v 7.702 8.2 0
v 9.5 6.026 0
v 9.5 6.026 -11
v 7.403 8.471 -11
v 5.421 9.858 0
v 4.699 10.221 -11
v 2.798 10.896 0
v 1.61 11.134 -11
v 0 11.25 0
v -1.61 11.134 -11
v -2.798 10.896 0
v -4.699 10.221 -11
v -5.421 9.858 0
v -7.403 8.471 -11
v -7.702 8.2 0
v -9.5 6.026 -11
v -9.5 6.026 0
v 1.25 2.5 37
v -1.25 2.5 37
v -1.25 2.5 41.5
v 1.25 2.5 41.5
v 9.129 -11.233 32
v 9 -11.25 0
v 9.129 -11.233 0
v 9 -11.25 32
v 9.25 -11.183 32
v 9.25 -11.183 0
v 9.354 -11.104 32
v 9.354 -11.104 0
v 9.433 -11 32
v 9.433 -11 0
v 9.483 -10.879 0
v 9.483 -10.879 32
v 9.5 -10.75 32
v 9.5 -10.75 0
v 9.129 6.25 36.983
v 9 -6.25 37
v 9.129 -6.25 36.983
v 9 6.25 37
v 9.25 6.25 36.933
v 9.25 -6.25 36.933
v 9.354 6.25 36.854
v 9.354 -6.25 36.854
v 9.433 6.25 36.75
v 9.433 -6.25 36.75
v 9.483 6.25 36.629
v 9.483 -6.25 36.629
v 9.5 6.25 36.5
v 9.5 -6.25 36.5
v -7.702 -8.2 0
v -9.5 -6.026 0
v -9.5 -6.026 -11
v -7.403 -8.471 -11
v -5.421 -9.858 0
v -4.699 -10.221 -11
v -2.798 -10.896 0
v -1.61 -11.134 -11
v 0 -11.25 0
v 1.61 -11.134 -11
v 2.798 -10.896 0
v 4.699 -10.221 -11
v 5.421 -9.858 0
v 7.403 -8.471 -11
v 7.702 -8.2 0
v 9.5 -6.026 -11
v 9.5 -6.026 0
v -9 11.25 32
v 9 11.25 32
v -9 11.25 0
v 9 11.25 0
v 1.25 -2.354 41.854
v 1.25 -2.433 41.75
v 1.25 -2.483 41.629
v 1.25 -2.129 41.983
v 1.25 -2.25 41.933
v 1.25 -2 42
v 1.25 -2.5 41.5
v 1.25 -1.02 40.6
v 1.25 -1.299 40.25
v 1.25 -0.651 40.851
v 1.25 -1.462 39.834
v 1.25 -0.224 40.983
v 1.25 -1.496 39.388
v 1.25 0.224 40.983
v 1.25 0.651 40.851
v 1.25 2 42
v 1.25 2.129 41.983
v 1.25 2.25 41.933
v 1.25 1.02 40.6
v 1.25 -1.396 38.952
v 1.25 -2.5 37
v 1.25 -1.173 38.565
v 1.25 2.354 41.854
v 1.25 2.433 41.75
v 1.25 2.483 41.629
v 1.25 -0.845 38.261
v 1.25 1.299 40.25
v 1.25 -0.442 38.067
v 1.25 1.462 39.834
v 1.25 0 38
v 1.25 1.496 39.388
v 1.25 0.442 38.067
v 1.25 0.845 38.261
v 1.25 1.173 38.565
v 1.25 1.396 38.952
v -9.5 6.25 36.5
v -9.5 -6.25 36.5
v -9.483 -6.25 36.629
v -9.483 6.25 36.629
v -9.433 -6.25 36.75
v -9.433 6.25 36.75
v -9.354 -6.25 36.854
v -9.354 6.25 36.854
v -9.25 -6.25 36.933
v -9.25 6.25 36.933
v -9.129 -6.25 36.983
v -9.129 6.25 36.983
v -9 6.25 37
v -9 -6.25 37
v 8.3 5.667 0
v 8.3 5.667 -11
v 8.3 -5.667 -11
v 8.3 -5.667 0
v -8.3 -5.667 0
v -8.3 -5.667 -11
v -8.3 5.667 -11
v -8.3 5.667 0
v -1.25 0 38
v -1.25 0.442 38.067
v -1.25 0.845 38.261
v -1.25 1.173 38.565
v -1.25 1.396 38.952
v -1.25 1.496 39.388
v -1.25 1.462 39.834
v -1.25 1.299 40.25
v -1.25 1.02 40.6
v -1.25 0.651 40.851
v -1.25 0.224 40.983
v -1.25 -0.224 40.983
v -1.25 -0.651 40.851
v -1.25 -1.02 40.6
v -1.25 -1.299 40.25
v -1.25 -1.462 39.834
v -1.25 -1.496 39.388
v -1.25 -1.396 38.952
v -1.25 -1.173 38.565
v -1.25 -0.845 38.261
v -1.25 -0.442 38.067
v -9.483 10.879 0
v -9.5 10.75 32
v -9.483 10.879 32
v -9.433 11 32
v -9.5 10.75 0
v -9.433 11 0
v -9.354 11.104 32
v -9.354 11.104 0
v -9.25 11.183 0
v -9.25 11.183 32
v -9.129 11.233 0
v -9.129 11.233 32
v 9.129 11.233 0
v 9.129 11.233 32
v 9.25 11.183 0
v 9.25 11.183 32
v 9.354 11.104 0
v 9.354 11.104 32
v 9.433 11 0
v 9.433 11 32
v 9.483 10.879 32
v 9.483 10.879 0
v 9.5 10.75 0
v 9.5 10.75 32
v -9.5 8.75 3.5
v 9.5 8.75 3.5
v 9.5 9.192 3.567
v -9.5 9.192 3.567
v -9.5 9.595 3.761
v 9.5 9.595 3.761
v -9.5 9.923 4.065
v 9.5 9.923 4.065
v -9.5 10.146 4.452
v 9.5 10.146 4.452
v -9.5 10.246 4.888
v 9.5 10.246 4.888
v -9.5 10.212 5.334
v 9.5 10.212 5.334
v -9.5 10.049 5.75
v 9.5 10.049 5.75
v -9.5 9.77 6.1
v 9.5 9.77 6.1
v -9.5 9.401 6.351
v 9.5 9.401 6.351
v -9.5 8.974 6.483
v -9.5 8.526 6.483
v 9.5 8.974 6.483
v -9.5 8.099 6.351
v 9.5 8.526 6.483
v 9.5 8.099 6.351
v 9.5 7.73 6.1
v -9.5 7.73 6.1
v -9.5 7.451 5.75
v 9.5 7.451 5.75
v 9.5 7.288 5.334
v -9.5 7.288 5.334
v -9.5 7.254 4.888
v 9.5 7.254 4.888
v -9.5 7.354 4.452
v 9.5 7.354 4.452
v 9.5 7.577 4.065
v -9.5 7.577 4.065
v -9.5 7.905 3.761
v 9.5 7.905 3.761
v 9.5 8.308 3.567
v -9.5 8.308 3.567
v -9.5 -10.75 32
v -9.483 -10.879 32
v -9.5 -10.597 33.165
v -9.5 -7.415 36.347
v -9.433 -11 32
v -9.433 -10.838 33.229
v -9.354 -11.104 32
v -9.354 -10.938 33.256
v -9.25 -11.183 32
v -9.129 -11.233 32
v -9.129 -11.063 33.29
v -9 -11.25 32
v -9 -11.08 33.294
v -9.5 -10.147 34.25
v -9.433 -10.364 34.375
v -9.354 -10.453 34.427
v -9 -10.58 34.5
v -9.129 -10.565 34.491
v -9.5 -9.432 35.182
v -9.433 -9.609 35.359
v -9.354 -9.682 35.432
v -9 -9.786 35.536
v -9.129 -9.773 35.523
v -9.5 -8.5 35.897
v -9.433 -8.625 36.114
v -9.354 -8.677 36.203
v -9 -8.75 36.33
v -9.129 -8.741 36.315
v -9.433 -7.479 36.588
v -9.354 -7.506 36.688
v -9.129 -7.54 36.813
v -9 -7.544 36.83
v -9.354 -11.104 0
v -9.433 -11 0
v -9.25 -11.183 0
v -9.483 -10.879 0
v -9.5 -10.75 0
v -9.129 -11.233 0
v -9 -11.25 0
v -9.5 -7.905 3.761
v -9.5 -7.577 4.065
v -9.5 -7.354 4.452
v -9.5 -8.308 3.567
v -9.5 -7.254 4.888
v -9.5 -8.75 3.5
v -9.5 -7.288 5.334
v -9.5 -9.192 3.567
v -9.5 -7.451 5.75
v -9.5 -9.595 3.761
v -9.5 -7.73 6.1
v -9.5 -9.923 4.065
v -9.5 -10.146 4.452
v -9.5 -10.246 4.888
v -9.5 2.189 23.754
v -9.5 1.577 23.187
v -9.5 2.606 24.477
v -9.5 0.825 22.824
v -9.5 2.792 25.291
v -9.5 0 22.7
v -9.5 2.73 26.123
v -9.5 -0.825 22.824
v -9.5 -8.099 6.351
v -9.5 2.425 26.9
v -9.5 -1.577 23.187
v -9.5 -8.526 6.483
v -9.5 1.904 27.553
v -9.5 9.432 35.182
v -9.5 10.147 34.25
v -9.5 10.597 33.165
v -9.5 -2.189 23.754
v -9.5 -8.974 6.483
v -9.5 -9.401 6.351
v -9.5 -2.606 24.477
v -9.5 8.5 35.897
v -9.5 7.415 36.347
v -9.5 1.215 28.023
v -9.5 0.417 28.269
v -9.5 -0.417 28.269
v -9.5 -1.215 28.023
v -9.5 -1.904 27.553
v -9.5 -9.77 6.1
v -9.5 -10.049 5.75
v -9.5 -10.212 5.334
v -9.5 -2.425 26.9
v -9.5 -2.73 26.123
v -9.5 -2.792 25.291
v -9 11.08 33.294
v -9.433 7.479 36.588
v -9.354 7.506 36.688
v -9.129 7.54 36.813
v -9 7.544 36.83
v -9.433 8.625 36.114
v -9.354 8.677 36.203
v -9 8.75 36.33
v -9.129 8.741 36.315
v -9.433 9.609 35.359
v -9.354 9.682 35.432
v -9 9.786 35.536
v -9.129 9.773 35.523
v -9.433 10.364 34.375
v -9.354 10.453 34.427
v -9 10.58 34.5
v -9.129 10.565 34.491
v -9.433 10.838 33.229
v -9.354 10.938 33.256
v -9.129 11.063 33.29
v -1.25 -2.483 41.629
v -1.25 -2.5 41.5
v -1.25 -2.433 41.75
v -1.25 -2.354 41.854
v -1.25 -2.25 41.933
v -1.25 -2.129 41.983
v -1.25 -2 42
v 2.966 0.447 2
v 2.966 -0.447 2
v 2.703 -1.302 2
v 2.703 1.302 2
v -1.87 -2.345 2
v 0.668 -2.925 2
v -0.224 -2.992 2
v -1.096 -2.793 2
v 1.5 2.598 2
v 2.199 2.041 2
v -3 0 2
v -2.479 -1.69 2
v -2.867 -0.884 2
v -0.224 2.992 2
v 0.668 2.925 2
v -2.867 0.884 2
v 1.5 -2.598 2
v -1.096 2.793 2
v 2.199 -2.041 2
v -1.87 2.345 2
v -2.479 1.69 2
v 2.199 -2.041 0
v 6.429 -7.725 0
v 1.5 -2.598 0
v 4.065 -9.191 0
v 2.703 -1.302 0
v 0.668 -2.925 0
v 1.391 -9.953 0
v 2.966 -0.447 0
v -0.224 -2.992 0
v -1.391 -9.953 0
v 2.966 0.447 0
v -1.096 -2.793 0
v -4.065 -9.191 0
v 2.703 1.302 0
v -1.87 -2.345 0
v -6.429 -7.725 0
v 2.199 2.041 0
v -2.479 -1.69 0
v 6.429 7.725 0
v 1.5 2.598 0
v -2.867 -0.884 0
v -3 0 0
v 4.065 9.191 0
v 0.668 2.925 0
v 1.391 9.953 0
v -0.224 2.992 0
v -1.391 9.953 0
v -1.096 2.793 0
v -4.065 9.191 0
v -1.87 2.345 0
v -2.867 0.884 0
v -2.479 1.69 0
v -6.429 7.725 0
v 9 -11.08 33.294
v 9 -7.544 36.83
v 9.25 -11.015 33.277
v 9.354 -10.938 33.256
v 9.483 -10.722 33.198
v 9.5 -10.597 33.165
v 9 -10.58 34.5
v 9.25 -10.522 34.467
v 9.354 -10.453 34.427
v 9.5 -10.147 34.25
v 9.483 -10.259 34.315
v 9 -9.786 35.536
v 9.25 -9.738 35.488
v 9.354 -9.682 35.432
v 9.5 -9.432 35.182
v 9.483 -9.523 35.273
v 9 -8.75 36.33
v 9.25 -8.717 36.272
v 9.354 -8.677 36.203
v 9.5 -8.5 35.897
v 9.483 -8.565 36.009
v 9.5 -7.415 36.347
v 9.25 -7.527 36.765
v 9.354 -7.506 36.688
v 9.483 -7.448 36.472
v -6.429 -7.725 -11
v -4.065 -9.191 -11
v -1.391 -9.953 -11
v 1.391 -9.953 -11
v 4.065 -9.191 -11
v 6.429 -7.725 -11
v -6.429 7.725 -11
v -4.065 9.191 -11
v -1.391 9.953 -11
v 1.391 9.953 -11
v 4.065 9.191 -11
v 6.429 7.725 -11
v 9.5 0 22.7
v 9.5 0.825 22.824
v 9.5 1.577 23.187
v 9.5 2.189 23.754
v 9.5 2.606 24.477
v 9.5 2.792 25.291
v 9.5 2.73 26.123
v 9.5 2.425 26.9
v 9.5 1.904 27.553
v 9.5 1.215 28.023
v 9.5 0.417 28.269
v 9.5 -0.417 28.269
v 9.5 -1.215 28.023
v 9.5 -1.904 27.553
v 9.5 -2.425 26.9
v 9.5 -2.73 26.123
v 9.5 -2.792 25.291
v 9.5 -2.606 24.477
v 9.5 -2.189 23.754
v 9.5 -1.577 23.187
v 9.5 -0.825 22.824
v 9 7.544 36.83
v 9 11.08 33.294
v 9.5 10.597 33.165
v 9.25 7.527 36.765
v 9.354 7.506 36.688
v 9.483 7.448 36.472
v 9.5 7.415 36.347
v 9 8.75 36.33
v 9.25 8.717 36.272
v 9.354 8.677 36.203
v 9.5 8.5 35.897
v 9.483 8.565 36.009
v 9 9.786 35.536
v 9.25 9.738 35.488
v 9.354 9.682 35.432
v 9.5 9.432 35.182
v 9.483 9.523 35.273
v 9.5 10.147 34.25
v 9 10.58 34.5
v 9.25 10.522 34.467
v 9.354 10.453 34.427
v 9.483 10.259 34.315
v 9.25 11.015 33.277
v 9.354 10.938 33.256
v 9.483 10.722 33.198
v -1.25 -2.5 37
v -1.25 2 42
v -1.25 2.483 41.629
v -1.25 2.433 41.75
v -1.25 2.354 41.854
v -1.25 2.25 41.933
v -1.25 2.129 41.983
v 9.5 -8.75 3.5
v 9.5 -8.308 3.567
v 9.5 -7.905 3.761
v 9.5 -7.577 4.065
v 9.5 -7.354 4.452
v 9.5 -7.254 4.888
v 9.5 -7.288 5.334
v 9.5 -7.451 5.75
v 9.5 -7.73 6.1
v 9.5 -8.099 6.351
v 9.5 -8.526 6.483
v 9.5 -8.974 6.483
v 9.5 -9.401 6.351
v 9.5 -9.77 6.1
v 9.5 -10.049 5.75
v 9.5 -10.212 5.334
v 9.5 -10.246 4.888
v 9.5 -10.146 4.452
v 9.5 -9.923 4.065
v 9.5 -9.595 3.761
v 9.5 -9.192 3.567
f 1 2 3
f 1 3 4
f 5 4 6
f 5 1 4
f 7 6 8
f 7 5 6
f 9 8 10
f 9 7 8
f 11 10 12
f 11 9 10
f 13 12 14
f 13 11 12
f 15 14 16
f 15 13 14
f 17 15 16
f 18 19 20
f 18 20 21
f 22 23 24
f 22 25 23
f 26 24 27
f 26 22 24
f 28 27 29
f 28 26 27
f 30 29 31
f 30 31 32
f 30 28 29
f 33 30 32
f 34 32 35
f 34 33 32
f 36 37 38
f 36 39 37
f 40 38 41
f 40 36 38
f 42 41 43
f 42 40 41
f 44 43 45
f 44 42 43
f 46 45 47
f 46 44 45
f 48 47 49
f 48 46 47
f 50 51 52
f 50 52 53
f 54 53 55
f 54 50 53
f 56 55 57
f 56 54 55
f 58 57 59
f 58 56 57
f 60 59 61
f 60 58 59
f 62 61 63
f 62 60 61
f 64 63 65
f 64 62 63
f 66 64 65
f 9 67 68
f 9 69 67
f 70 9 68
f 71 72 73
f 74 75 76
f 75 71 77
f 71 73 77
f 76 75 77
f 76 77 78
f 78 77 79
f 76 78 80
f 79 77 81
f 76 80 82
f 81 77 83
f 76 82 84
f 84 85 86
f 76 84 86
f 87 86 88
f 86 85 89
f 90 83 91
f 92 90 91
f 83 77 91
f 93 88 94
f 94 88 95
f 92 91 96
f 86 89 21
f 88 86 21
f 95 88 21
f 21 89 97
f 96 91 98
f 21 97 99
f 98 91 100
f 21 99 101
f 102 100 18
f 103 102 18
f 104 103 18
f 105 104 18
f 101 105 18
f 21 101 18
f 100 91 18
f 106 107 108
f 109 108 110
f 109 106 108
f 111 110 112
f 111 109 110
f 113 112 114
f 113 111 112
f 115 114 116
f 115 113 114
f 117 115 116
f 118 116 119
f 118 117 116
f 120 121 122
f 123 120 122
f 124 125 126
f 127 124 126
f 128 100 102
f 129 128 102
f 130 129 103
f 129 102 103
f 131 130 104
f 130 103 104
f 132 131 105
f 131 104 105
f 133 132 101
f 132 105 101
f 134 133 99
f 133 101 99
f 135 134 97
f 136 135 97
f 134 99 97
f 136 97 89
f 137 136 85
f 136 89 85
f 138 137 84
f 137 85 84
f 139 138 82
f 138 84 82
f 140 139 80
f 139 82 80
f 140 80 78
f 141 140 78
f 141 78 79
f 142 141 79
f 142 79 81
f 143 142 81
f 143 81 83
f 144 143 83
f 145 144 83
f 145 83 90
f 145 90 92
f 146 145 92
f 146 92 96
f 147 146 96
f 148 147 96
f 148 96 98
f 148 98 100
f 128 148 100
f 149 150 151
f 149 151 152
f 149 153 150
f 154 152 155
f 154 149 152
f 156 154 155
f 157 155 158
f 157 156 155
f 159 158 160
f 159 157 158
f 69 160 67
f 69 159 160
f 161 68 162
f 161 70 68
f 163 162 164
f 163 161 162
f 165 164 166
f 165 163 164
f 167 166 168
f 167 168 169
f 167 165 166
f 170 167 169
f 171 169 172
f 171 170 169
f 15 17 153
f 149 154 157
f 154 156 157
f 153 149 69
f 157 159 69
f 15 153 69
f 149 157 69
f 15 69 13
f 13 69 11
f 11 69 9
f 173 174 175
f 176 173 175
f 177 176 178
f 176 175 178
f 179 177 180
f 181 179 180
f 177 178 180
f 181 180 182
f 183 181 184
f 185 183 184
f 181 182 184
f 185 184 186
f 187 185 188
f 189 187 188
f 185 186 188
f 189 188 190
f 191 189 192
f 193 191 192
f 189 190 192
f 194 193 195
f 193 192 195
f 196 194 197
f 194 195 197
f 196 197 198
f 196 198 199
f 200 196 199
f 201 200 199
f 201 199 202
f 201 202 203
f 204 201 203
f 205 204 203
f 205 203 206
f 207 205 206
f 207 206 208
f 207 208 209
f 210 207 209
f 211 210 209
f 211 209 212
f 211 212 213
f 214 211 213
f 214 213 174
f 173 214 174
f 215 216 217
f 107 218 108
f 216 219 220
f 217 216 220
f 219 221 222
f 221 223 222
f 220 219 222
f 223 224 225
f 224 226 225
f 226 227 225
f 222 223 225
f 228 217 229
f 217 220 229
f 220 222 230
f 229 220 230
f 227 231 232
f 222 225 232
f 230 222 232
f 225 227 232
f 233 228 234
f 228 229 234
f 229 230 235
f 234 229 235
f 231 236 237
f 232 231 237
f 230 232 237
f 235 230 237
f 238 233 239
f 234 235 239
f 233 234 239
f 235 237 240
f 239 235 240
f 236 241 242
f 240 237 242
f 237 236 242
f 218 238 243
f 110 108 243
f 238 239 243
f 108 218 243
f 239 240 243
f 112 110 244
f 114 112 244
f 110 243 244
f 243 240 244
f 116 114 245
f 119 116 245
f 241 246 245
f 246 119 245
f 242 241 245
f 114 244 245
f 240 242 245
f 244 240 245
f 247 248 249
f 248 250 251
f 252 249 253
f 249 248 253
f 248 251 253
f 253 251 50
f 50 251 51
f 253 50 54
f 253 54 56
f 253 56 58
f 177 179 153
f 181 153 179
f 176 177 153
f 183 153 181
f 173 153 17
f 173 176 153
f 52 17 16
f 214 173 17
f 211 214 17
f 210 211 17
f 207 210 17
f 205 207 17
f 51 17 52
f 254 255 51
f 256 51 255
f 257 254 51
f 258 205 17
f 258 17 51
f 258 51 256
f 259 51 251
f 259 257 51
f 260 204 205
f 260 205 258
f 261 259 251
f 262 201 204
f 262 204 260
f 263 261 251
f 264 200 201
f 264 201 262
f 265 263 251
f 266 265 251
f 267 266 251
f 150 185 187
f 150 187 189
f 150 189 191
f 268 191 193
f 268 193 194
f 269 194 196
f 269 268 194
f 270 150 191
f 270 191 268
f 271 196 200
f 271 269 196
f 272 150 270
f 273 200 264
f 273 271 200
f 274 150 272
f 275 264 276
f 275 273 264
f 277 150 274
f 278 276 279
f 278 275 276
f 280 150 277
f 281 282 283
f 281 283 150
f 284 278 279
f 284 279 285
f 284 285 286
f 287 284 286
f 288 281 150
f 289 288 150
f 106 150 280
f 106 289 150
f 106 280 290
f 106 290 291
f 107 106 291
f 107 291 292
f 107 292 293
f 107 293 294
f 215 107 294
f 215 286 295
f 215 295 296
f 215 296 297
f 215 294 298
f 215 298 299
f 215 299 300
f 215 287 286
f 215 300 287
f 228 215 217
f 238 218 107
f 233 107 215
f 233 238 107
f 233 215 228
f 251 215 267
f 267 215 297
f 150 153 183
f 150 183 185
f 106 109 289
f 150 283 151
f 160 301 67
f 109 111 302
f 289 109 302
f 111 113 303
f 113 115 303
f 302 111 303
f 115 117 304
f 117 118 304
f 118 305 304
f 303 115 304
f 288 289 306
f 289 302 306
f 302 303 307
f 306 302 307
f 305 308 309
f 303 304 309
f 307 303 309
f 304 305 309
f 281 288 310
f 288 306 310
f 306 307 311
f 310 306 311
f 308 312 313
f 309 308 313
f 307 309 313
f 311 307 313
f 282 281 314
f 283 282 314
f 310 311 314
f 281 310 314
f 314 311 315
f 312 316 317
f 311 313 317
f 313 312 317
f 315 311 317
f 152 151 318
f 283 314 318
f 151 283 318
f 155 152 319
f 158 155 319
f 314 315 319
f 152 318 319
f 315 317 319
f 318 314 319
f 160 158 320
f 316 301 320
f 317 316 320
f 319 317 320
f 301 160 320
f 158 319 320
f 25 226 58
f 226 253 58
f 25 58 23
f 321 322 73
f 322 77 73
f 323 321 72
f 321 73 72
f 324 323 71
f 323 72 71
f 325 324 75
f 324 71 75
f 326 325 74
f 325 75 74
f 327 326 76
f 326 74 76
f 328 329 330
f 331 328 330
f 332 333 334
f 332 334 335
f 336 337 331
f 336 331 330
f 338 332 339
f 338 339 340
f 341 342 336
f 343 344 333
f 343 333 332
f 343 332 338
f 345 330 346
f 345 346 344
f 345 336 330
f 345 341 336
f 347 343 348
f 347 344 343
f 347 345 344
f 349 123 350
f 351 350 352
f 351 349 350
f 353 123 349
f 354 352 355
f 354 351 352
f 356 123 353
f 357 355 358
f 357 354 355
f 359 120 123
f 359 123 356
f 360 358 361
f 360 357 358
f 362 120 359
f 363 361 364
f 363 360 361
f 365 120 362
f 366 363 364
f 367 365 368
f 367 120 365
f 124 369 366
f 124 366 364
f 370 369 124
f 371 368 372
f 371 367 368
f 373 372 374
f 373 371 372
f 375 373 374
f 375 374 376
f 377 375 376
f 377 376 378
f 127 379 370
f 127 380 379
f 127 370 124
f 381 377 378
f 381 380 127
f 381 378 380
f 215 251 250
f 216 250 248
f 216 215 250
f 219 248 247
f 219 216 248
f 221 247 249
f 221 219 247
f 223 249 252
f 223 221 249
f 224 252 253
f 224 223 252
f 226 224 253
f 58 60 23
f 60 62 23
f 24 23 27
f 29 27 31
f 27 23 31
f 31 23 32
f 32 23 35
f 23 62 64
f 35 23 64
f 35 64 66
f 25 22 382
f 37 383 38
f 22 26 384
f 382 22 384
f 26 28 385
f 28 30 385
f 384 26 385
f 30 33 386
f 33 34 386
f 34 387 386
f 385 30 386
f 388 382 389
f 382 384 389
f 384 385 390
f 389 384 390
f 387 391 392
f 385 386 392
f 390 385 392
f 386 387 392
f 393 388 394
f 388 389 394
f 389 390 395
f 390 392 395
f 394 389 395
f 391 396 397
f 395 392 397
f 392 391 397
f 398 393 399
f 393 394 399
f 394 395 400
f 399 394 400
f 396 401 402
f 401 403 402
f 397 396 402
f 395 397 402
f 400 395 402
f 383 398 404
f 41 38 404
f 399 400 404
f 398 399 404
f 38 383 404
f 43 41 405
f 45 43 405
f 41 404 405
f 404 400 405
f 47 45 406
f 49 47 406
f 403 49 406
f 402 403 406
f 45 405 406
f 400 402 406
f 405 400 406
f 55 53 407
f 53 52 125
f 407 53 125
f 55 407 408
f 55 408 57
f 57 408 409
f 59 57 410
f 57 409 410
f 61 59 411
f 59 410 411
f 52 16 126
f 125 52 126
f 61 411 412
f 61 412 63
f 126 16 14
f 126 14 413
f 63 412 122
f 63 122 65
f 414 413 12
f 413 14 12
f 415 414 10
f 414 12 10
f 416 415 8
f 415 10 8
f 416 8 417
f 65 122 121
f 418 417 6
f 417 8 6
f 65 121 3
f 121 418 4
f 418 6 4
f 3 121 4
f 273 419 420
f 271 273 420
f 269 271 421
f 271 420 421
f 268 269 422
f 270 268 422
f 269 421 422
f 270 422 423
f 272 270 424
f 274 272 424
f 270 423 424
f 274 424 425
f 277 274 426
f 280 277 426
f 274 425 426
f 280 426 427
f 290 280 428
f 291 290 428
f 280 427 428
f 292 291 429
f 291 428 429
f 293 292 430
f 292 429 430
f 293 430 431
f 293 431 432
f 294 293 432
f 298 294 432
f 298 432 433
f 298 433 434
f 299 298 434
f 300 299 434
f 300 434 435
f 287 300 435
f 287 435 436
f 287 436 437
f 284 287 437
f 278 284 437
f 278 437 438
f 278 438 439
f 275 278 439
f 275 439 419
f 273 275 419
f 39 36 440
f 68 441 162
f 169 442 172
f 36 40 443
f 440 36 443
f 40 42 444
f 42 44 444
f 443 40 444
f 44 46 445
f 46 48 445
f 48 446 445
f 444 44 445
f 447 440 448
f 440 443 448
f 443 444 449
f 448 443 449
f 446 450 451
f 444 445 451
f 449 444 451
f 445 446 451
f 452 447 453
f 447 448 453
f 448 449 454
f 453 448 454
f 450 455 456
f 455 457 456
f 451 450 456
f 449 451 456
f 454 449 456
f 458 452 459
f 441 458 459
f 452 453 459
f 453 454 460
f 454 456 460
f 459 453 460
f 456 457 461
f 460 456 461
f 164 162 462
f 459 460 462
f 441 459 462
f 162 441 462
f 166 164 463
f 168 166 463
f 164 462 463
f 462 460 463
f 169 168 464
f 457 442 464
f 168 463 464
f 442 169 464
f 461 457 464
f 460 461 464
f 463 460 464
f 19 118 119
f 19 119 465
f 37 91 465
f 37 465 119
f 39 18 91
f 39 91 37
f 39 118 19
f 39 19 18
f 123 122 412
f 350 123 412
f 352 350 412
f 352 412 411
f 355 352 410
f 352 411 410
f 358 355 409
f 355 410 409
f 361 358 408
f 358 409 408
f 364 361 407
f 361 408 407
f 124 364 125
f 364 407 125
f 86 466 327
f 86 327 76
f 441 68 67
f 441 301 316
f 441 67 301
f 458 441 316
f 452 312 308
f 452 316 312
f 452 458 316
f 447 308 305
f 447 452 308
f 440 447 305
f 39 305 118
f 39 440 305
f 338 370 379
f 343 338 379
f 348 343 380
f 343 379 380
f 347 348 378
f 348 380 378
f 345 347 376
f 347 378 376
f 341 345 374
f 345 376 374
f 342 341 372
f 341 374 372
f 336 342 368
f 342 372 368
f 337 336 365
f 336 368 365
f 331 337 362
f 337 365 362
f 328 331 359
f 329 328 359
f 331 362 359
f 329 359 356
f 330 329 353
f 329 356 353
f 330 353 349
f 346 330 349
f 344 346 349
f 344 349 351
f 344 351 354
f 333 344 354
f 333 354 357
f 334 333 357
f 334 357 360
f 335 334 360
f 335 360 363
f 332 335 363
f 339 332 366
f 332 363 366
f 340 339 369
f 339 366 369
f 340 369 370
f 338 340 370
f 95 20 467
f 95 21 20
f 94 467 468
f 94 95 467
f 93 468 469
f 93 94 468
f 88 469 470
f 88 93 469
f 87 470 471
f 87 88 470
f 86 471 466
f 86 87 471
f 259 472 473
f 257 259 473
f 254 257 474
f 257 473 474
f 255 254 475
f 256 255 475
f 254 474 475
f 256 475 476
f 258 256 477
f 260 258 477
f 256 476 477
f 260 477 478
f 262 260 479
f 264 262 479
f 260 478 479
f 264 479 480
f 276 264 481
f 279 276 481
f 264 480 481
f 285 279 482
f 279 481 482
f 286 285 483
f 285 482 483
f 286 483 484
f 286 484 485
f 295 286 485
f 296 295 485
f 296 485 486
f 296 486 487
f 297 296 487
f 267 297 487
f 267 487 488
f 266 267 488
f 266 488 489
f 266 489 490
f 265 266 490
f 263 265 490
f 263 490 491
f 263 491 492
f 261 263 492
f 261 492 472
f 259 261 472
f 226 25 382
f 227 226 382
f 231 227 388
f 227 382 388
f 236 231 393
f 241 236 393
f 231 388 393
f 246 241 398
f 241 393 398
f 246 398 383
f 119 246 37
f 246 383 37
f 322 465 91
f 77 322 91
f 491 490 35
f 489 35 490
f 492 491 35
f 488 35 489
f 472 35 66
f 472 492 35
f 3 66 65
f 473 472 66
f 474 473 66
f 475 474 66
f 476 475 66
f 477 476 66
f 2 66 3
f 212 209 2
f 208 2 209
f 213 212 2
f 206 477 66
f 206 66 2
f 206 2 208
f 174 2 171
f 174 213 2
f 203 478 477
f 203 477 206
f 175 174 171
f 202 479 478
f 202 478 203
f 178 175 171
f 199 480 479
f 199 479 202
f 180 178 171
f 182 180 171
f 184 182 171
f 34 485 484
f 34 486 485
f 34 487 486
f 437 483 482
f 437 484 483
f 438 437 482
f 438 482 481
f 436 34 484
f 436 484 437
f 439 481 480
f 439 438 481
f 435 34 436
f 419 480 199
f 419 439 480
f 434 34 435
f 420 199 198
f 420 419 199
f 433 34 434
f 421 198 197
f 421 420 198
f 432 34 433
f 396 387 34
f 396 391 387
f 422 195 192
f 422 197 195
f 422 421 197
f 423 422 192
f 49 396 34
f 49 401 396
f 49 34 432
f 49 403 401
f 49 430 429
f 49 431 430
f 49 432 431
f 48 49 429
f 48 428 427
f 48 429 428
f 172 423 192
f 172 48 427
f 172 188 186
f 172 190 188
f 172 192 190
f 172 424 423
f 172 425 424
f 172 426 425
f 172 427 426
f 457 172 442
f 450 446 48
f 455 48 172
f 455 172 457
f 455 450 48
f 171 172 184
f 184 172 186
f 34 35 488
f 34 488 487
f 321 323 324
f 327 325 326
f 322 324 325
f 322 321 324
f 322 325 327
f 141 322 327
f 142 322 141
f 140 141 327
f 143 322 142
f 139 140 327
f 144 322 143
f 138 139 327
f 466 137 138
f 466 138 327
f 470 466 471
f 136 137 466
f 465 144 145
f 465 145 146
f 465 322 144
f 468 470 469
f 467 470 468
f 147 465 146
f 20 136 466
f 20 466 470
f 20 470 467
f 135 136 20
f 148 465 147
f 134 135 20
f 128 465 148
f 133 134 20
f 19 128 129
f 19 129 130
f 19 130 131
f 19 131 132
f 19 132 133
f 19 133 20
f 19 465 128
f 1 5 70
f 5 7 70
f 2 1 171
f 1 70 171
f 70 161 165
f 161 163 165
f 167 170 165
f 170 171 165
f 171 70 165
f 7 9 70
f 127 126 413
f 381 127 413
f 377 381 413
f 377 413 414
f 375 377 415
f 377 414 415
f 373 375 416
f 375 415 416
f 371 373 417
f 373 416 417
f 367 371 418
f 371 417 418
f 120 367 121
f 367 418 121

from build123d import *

# Parameters (mm, degrees)
SKETCH1_W           = 19
SKETCH1_H           = 22.5
BOSS_EXTRUDE1_DEPTH = 37
BOSS_EXTRUDE2_DEPTH = 11
FILLET1_R           = 5
SKETCH3_R           = 1.5
CUT_EXTRUDE1_DEPTH  = 20
SKETCH4_W           = 2.5
SKETCH4_H           = 5
BOSS_EXTRUDE3_DEPTH = 5
FILLET2_R           = 0.5
SKETCH5_R           = 1.5
CUT_EXTRUDE2_DEPTH  = 5
SKETCH6_R           = 2.8
CUT_EXTRUDE3_DEPTH  = 20
CUT_EXTRUDE4_DEPTH  = 11
SKETCH8_R           = 3
CUT_EXTRUDE5_DEPTH  = 2


with BuildPart() as part:
    # Sketch1 → Boss-Extrude1 (new body)
    with BuildSketch(Plane.XY):
        Rectangle(SKETCH1_W, SKETCH1_H)
    extrude(amount=BOSS_EXTRUDE1_DEPTH)

    # Sketch2 → Boss-Extrude2 (add)
    with BuildSketch(Plane(origin=(0, 0, 0), x_dir=(-1, 0, 0), z_dir=(0, 0, -1))):
        with BuildLine():
            Line((9.5, 6.025985397), (9.5, -6.025985397))
            ThreePointArc((9.5, -6.025985397), (0, -11.25), (-9.5, -6.025985397))
            Line((-9.5, -6.025985397), (-9.5, 6.025985397))
            ThreePointArc((-9.5, 6.025985397), (0, 11.25), (9.5, 6.025985397))
        make_face()
    extrude(amount=BOSS_EXTRUDE2_DEPTH)

    # Fillet1
    fillet1_edges = [part.edges().sort_by_distance(p)[0] for p in [
        (0, 11.25, 37),
        (0, -11.25, 37),
    ]]
    fillet(fillet1_edges, radius=FILLET1_R)

    # Sketch3 → Cut-Extrude1 (cut, through all)
    with BuildSketch(Plane(origin=(9.5, 0, 0), x_dir=(0, 0, -1), z_dir=(1, 0, 0))):
        with Locations((-5, 8.75)):
            Circle(SKETCH3_R)
        with Locations((-5, -8.75)):
            Circle(SKETCH3_R)
    extrude(amount=-CUT_EXTRUDE1_DEPTH, mode=Mode.SUBTRACT)

    # Sketch4 → Boss-Extrude3 (add)
    with BuildSketch(Plane.XY.offset(37)):
        Rectangle(SKETCH4_W, SKETCH4_H)
    extrude(amount=BOSS_EXTRUDE3_DEPTH)

    # Fillet2
    fillet2_edges = [part.edges().sort_by_distance(p)[0] for p in [
        (-9.5, 0, 37),
        (9.5, 0, 37),
        (9.5, 11.25, 16),
        (9.5, -11.25, 16),
        (9.5, 9.785533906, 35.535533906),
        (9.5, -9.785533906, 35.535533906),
        (-9.5, -11.25, 16),
        (-9.5, 11.25, 16),
        (-9.5, 9.785533906, 35.535533906),
        (-9.5, -9.785533906, 35.535533906),
        (0, -2.5, 42),
        (0, 2.5, 42),
    ]]
    fillet(fillet2_edges, radius=FILLET2_R)

    # Sketch5 → Cut-Extrude2 (cut)
    with BuildSketch(Plane(origin=(1.25, 0, 0), x_dir=(0, 0, -1), z_dir=(1, 0, 0))):
        with Locations((-39.5, 0)):
            Circle(SKETCH5_R)
    extrude(amount=-CUT_EXTRUDE2_DEPTH, mode=Mode.SUBTRACT)

    # Sketch6 → Cut-Extrude3 (cut, through all)
    with BuildSketch(Plane(origin=(9.5, 0, 0), x_dir=(0, 0, -1), z_dir=(1, 0, 0))):
        with Locations((-25.5, 0)):
            Circle(SKETCH6_R)
    extrude(amount=-CUT_EXTRUDE3_DEPTH, mode=Mode.SUBTRACT)

    # Sketch7 → Cut-Extrude4 (cut)
    with BuildSketch(Plane(origin=(0, 0, -11), x_dir=(-1, 0, 0), z_dir=(0, 0, -1))):
        with BuildLine():
            Line((-8.3, 5.666789214), (-8.3, -5.666789214))
            ThreePointArc((-8.3, -5.666789214), (0, -10.05), (8.3, -5.666789214))
            Line((8.3, -5.666789214), (8.3, 5.666789214))
            ThreePointArc((8.3, 5.666789214), (0, 10.05), (-8.3, 5.666789214))
        make_face()
    extrude(amount=-CUT_EXTRUDE4_DEPTH, mode=Mode.SUBTRACT)

    # Sketch8 → Cut-Extrude5 (cut)
    with BuildSketch(Plane(origin=(0, 0, 0), x_dir=(-1, 0, 0), z_dir=(0, 0, -1))):
        Circle(SKETCH8_R)
    extrude(amount=-CUT_EXTRUDE5_DEPTH, mode=Mode.SUBTRACT)


solid = part.part
